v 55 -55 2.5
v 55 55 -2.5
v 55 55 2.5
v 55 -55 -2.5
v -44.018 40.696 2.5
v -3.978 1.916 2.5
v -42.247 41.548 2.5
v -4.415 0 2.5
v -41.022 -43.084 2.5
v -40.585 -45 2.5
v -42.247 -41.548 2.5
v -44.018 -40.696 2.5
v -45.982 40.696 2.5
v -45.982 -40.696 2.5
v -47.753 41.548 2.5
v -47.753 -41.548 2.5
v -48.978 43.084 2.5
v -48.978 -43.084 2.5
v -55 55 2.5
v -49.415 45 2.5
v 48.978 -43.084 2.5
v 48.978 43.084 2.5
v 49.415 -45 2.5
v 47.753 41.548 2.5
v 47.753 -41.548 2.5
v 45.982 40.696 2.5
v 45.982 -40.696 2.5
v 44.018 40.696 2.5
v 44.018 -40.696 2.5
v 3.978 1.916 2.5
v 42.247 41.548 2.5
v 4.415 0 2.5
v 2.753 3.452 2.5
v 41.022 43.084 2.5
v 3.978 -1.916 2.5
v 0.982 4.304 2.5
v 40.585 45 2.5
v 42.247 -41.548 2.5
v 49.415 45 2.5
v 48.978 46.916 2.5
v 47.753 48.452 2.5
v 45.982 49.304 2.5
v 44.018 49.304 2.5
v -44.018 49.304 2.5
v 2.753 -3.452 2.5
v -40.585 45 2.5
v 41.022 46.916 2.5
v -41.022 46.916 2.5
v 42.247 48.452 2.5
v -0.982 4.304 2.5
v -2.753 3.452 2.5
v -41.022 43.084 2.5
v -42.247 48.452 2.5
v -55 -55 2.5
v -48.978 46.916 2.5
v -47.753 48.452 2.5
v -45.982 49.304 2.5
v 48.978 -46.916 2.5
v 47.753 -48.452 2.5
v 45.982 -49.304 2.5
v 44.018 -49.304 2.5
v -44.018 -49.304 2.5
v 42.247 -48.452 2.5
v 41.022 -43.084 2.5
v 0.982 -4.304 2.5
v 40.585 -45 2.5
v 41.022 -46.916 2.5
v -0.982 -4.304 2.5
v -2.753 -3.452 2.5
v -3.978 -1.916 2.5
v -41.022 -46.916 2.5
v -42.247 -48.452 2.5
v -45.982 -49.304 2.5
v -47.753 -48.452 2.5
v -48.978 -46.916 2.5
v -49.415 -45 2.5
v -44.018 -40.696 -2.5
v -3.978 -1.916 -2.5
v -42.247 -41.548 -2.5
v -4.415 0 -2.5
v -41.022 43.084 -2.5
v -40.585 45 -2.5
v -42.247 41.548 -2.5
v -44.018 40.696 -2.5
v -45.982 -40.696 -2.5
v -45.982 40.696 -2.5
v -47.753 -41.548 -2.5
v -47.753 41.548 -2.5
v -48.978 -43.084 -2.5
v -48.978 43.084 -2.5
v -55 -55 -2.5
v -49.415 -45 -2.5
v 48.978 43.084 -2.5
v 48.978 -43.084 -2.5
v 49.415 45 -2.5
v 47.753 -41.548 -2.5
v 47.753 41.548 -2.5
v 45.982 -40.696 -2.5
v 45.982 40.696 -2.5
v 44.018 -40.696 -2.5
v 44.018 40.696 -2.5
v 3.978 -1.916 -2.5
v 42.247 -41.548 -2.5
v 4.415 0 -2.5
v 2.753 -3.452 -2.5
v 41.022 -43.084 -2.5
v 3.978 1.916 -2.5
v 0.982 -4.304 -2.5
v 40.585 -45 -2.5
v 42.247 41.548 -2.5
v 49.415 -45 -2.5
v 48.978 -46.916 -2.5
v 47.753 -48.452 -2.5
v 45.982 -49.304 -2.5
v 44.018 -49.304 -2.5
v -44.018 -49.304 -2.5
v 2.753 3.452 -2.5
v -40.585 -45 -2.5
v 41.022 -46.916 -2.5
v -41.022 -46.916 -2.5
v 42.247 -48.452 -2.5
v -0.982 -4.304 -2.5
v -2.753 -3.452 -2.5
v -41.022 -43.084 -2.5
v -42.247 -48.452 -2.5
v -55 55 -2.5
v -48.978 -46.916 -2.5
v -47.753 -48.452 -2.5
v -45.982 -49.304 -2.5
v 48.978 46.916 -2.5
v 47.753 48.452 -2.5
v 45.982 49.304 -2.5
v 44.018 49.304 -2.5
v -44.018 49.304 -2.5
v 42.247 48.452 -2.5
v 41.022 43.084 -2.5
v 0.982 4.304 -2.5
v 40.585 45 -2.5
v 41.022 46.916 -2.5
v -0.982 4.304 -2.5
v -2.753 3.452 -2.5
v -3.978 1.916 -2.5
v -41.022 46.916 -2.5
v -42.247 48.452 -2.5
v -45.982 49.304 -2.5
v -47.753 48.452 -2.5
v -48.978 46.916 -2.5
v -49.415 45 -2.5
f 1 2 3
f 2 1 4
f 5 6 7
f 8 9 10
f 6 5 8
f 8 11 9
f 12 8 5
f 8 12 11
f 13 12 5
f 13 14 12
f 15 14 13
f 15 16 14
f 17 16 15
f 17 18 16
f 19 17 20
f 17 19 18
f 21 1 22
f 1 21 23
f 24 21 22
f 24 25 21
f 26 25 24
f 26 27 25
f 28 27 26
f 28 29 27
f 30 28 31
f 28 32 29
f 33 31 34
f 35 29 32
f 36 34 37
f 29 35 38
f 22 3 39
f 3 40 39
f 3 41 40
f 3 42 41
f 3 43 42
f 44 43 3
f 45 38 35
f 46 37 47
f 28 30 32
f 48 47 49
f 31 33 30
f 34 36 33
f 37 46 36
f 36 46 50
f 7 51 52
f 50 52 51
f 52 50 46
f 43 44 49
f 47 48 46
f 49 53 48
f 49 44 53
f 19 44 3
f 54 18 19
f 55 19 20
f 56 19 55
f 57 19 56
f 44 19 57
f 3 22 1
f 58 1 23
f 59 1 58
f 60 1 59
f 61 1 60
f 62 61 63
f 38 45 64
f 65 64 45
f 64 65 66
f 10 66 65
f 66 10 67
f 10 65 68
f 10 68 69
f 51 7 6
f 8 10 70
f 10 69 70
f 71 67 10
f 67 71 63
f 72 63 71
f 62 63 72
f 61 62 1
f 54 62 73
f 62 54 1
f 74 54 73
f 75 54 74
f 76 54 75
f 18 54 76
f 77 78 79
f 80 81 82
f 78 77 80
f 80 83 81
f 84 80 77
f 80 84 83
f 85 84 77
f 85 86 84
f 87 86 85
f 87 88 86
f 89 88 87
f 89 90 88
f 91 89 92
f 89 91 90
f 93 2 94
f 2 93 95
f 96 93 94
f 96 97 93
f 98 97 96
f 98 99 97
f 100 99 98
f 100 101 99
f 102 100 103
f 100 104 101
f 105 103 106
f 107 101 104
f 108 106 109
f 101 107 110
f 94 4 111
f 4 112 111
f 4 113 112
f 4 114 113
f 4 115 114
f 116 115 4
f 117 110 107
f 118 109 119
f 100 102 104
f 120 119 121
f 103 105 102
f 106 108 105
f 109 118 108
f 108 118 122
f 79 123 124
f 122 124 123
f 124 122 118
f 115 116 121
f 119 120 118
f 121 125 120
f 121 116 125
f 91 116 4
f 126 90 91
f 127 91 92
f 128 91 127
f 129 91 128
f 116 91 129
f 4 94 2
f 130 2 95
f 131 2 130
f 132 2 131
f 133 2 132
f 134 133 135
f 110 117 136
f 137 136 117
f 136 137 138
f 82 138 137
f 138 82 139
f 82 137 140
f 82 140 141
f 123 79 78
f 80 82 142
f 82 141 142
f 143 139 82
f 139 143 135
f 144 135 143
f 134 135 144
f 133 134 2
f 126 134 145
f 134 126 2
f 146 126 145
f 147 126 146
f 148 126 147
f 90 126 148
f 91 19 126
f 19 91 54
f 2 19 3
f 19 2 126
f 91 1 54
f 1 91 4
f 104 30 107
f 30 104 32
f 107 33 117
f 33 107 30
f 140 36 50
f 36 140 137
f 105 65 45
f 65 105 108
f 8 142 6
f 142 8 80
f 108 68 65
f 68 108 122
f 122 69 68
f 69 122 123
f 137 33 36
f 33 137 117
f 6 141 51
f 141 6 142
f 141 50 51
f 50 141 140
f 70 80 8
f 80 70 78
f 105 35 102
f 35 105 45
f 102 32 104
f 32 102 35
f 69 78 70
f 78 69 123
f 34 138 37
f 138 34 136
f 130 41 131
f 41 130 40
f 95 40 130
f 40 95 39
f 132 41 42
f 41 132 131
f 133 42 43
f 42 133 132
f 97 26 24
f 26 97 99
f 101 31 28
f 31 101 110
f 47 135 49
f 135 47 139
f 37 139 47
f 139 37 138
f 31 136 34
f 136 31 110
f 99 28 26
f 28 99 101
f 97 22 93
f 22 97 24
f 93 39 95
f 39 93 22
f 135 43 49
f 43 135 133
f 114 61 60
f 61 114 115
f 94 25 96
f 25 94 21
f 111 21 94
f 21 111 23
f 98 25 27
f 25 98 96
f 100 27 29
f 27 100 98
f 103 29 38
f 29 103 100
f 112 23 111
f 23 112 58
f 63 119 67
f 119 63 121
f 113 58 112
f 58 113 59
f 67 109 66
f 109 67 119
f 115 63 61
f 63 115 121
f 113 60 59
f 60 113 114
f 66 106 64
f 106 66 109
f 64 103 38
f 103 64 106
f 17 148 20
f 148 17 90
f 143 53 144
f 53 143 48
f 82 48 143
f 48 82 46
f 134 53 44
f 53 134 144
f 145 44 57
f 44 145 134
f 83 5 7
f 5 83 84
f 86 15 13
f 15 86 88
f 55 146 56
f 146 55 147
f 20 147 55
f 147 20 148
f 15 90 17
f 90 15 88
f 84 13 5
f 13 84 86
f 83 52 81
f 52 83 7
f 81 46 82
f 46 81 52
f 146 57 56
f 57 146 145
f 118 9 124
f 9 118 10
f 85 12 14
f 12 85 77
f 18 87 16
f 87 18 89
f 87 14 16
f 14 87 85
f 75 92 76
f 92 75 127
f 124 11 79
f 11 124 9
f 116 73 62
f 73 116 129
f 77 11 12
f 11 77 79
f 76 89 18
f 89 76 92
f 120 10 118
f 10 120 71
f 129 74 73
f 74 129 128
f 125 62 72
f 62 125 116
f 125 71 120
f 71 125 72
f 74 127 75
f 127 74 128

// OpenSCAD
sr=8.83; //  standard diameter
T=5; //thickness

module bore(){
	cylinder(h=(T+2),d=sr,center=true);
}
/*
module threadrod(){
	color("Blue",0.5) cylinder(h=
}
*/

module isoplate(){
	difference(){
		cube([110,110,T],center=true);
		bore();
		//translate([0,-35,0]) bore();

		translate([45,45,0]) bore();
		translate([45,-45,0]) bore();
		translate([-45,45,0]) bore();
		translate([-45,-45,0]) bore();
	}
	
}

isoplate();
